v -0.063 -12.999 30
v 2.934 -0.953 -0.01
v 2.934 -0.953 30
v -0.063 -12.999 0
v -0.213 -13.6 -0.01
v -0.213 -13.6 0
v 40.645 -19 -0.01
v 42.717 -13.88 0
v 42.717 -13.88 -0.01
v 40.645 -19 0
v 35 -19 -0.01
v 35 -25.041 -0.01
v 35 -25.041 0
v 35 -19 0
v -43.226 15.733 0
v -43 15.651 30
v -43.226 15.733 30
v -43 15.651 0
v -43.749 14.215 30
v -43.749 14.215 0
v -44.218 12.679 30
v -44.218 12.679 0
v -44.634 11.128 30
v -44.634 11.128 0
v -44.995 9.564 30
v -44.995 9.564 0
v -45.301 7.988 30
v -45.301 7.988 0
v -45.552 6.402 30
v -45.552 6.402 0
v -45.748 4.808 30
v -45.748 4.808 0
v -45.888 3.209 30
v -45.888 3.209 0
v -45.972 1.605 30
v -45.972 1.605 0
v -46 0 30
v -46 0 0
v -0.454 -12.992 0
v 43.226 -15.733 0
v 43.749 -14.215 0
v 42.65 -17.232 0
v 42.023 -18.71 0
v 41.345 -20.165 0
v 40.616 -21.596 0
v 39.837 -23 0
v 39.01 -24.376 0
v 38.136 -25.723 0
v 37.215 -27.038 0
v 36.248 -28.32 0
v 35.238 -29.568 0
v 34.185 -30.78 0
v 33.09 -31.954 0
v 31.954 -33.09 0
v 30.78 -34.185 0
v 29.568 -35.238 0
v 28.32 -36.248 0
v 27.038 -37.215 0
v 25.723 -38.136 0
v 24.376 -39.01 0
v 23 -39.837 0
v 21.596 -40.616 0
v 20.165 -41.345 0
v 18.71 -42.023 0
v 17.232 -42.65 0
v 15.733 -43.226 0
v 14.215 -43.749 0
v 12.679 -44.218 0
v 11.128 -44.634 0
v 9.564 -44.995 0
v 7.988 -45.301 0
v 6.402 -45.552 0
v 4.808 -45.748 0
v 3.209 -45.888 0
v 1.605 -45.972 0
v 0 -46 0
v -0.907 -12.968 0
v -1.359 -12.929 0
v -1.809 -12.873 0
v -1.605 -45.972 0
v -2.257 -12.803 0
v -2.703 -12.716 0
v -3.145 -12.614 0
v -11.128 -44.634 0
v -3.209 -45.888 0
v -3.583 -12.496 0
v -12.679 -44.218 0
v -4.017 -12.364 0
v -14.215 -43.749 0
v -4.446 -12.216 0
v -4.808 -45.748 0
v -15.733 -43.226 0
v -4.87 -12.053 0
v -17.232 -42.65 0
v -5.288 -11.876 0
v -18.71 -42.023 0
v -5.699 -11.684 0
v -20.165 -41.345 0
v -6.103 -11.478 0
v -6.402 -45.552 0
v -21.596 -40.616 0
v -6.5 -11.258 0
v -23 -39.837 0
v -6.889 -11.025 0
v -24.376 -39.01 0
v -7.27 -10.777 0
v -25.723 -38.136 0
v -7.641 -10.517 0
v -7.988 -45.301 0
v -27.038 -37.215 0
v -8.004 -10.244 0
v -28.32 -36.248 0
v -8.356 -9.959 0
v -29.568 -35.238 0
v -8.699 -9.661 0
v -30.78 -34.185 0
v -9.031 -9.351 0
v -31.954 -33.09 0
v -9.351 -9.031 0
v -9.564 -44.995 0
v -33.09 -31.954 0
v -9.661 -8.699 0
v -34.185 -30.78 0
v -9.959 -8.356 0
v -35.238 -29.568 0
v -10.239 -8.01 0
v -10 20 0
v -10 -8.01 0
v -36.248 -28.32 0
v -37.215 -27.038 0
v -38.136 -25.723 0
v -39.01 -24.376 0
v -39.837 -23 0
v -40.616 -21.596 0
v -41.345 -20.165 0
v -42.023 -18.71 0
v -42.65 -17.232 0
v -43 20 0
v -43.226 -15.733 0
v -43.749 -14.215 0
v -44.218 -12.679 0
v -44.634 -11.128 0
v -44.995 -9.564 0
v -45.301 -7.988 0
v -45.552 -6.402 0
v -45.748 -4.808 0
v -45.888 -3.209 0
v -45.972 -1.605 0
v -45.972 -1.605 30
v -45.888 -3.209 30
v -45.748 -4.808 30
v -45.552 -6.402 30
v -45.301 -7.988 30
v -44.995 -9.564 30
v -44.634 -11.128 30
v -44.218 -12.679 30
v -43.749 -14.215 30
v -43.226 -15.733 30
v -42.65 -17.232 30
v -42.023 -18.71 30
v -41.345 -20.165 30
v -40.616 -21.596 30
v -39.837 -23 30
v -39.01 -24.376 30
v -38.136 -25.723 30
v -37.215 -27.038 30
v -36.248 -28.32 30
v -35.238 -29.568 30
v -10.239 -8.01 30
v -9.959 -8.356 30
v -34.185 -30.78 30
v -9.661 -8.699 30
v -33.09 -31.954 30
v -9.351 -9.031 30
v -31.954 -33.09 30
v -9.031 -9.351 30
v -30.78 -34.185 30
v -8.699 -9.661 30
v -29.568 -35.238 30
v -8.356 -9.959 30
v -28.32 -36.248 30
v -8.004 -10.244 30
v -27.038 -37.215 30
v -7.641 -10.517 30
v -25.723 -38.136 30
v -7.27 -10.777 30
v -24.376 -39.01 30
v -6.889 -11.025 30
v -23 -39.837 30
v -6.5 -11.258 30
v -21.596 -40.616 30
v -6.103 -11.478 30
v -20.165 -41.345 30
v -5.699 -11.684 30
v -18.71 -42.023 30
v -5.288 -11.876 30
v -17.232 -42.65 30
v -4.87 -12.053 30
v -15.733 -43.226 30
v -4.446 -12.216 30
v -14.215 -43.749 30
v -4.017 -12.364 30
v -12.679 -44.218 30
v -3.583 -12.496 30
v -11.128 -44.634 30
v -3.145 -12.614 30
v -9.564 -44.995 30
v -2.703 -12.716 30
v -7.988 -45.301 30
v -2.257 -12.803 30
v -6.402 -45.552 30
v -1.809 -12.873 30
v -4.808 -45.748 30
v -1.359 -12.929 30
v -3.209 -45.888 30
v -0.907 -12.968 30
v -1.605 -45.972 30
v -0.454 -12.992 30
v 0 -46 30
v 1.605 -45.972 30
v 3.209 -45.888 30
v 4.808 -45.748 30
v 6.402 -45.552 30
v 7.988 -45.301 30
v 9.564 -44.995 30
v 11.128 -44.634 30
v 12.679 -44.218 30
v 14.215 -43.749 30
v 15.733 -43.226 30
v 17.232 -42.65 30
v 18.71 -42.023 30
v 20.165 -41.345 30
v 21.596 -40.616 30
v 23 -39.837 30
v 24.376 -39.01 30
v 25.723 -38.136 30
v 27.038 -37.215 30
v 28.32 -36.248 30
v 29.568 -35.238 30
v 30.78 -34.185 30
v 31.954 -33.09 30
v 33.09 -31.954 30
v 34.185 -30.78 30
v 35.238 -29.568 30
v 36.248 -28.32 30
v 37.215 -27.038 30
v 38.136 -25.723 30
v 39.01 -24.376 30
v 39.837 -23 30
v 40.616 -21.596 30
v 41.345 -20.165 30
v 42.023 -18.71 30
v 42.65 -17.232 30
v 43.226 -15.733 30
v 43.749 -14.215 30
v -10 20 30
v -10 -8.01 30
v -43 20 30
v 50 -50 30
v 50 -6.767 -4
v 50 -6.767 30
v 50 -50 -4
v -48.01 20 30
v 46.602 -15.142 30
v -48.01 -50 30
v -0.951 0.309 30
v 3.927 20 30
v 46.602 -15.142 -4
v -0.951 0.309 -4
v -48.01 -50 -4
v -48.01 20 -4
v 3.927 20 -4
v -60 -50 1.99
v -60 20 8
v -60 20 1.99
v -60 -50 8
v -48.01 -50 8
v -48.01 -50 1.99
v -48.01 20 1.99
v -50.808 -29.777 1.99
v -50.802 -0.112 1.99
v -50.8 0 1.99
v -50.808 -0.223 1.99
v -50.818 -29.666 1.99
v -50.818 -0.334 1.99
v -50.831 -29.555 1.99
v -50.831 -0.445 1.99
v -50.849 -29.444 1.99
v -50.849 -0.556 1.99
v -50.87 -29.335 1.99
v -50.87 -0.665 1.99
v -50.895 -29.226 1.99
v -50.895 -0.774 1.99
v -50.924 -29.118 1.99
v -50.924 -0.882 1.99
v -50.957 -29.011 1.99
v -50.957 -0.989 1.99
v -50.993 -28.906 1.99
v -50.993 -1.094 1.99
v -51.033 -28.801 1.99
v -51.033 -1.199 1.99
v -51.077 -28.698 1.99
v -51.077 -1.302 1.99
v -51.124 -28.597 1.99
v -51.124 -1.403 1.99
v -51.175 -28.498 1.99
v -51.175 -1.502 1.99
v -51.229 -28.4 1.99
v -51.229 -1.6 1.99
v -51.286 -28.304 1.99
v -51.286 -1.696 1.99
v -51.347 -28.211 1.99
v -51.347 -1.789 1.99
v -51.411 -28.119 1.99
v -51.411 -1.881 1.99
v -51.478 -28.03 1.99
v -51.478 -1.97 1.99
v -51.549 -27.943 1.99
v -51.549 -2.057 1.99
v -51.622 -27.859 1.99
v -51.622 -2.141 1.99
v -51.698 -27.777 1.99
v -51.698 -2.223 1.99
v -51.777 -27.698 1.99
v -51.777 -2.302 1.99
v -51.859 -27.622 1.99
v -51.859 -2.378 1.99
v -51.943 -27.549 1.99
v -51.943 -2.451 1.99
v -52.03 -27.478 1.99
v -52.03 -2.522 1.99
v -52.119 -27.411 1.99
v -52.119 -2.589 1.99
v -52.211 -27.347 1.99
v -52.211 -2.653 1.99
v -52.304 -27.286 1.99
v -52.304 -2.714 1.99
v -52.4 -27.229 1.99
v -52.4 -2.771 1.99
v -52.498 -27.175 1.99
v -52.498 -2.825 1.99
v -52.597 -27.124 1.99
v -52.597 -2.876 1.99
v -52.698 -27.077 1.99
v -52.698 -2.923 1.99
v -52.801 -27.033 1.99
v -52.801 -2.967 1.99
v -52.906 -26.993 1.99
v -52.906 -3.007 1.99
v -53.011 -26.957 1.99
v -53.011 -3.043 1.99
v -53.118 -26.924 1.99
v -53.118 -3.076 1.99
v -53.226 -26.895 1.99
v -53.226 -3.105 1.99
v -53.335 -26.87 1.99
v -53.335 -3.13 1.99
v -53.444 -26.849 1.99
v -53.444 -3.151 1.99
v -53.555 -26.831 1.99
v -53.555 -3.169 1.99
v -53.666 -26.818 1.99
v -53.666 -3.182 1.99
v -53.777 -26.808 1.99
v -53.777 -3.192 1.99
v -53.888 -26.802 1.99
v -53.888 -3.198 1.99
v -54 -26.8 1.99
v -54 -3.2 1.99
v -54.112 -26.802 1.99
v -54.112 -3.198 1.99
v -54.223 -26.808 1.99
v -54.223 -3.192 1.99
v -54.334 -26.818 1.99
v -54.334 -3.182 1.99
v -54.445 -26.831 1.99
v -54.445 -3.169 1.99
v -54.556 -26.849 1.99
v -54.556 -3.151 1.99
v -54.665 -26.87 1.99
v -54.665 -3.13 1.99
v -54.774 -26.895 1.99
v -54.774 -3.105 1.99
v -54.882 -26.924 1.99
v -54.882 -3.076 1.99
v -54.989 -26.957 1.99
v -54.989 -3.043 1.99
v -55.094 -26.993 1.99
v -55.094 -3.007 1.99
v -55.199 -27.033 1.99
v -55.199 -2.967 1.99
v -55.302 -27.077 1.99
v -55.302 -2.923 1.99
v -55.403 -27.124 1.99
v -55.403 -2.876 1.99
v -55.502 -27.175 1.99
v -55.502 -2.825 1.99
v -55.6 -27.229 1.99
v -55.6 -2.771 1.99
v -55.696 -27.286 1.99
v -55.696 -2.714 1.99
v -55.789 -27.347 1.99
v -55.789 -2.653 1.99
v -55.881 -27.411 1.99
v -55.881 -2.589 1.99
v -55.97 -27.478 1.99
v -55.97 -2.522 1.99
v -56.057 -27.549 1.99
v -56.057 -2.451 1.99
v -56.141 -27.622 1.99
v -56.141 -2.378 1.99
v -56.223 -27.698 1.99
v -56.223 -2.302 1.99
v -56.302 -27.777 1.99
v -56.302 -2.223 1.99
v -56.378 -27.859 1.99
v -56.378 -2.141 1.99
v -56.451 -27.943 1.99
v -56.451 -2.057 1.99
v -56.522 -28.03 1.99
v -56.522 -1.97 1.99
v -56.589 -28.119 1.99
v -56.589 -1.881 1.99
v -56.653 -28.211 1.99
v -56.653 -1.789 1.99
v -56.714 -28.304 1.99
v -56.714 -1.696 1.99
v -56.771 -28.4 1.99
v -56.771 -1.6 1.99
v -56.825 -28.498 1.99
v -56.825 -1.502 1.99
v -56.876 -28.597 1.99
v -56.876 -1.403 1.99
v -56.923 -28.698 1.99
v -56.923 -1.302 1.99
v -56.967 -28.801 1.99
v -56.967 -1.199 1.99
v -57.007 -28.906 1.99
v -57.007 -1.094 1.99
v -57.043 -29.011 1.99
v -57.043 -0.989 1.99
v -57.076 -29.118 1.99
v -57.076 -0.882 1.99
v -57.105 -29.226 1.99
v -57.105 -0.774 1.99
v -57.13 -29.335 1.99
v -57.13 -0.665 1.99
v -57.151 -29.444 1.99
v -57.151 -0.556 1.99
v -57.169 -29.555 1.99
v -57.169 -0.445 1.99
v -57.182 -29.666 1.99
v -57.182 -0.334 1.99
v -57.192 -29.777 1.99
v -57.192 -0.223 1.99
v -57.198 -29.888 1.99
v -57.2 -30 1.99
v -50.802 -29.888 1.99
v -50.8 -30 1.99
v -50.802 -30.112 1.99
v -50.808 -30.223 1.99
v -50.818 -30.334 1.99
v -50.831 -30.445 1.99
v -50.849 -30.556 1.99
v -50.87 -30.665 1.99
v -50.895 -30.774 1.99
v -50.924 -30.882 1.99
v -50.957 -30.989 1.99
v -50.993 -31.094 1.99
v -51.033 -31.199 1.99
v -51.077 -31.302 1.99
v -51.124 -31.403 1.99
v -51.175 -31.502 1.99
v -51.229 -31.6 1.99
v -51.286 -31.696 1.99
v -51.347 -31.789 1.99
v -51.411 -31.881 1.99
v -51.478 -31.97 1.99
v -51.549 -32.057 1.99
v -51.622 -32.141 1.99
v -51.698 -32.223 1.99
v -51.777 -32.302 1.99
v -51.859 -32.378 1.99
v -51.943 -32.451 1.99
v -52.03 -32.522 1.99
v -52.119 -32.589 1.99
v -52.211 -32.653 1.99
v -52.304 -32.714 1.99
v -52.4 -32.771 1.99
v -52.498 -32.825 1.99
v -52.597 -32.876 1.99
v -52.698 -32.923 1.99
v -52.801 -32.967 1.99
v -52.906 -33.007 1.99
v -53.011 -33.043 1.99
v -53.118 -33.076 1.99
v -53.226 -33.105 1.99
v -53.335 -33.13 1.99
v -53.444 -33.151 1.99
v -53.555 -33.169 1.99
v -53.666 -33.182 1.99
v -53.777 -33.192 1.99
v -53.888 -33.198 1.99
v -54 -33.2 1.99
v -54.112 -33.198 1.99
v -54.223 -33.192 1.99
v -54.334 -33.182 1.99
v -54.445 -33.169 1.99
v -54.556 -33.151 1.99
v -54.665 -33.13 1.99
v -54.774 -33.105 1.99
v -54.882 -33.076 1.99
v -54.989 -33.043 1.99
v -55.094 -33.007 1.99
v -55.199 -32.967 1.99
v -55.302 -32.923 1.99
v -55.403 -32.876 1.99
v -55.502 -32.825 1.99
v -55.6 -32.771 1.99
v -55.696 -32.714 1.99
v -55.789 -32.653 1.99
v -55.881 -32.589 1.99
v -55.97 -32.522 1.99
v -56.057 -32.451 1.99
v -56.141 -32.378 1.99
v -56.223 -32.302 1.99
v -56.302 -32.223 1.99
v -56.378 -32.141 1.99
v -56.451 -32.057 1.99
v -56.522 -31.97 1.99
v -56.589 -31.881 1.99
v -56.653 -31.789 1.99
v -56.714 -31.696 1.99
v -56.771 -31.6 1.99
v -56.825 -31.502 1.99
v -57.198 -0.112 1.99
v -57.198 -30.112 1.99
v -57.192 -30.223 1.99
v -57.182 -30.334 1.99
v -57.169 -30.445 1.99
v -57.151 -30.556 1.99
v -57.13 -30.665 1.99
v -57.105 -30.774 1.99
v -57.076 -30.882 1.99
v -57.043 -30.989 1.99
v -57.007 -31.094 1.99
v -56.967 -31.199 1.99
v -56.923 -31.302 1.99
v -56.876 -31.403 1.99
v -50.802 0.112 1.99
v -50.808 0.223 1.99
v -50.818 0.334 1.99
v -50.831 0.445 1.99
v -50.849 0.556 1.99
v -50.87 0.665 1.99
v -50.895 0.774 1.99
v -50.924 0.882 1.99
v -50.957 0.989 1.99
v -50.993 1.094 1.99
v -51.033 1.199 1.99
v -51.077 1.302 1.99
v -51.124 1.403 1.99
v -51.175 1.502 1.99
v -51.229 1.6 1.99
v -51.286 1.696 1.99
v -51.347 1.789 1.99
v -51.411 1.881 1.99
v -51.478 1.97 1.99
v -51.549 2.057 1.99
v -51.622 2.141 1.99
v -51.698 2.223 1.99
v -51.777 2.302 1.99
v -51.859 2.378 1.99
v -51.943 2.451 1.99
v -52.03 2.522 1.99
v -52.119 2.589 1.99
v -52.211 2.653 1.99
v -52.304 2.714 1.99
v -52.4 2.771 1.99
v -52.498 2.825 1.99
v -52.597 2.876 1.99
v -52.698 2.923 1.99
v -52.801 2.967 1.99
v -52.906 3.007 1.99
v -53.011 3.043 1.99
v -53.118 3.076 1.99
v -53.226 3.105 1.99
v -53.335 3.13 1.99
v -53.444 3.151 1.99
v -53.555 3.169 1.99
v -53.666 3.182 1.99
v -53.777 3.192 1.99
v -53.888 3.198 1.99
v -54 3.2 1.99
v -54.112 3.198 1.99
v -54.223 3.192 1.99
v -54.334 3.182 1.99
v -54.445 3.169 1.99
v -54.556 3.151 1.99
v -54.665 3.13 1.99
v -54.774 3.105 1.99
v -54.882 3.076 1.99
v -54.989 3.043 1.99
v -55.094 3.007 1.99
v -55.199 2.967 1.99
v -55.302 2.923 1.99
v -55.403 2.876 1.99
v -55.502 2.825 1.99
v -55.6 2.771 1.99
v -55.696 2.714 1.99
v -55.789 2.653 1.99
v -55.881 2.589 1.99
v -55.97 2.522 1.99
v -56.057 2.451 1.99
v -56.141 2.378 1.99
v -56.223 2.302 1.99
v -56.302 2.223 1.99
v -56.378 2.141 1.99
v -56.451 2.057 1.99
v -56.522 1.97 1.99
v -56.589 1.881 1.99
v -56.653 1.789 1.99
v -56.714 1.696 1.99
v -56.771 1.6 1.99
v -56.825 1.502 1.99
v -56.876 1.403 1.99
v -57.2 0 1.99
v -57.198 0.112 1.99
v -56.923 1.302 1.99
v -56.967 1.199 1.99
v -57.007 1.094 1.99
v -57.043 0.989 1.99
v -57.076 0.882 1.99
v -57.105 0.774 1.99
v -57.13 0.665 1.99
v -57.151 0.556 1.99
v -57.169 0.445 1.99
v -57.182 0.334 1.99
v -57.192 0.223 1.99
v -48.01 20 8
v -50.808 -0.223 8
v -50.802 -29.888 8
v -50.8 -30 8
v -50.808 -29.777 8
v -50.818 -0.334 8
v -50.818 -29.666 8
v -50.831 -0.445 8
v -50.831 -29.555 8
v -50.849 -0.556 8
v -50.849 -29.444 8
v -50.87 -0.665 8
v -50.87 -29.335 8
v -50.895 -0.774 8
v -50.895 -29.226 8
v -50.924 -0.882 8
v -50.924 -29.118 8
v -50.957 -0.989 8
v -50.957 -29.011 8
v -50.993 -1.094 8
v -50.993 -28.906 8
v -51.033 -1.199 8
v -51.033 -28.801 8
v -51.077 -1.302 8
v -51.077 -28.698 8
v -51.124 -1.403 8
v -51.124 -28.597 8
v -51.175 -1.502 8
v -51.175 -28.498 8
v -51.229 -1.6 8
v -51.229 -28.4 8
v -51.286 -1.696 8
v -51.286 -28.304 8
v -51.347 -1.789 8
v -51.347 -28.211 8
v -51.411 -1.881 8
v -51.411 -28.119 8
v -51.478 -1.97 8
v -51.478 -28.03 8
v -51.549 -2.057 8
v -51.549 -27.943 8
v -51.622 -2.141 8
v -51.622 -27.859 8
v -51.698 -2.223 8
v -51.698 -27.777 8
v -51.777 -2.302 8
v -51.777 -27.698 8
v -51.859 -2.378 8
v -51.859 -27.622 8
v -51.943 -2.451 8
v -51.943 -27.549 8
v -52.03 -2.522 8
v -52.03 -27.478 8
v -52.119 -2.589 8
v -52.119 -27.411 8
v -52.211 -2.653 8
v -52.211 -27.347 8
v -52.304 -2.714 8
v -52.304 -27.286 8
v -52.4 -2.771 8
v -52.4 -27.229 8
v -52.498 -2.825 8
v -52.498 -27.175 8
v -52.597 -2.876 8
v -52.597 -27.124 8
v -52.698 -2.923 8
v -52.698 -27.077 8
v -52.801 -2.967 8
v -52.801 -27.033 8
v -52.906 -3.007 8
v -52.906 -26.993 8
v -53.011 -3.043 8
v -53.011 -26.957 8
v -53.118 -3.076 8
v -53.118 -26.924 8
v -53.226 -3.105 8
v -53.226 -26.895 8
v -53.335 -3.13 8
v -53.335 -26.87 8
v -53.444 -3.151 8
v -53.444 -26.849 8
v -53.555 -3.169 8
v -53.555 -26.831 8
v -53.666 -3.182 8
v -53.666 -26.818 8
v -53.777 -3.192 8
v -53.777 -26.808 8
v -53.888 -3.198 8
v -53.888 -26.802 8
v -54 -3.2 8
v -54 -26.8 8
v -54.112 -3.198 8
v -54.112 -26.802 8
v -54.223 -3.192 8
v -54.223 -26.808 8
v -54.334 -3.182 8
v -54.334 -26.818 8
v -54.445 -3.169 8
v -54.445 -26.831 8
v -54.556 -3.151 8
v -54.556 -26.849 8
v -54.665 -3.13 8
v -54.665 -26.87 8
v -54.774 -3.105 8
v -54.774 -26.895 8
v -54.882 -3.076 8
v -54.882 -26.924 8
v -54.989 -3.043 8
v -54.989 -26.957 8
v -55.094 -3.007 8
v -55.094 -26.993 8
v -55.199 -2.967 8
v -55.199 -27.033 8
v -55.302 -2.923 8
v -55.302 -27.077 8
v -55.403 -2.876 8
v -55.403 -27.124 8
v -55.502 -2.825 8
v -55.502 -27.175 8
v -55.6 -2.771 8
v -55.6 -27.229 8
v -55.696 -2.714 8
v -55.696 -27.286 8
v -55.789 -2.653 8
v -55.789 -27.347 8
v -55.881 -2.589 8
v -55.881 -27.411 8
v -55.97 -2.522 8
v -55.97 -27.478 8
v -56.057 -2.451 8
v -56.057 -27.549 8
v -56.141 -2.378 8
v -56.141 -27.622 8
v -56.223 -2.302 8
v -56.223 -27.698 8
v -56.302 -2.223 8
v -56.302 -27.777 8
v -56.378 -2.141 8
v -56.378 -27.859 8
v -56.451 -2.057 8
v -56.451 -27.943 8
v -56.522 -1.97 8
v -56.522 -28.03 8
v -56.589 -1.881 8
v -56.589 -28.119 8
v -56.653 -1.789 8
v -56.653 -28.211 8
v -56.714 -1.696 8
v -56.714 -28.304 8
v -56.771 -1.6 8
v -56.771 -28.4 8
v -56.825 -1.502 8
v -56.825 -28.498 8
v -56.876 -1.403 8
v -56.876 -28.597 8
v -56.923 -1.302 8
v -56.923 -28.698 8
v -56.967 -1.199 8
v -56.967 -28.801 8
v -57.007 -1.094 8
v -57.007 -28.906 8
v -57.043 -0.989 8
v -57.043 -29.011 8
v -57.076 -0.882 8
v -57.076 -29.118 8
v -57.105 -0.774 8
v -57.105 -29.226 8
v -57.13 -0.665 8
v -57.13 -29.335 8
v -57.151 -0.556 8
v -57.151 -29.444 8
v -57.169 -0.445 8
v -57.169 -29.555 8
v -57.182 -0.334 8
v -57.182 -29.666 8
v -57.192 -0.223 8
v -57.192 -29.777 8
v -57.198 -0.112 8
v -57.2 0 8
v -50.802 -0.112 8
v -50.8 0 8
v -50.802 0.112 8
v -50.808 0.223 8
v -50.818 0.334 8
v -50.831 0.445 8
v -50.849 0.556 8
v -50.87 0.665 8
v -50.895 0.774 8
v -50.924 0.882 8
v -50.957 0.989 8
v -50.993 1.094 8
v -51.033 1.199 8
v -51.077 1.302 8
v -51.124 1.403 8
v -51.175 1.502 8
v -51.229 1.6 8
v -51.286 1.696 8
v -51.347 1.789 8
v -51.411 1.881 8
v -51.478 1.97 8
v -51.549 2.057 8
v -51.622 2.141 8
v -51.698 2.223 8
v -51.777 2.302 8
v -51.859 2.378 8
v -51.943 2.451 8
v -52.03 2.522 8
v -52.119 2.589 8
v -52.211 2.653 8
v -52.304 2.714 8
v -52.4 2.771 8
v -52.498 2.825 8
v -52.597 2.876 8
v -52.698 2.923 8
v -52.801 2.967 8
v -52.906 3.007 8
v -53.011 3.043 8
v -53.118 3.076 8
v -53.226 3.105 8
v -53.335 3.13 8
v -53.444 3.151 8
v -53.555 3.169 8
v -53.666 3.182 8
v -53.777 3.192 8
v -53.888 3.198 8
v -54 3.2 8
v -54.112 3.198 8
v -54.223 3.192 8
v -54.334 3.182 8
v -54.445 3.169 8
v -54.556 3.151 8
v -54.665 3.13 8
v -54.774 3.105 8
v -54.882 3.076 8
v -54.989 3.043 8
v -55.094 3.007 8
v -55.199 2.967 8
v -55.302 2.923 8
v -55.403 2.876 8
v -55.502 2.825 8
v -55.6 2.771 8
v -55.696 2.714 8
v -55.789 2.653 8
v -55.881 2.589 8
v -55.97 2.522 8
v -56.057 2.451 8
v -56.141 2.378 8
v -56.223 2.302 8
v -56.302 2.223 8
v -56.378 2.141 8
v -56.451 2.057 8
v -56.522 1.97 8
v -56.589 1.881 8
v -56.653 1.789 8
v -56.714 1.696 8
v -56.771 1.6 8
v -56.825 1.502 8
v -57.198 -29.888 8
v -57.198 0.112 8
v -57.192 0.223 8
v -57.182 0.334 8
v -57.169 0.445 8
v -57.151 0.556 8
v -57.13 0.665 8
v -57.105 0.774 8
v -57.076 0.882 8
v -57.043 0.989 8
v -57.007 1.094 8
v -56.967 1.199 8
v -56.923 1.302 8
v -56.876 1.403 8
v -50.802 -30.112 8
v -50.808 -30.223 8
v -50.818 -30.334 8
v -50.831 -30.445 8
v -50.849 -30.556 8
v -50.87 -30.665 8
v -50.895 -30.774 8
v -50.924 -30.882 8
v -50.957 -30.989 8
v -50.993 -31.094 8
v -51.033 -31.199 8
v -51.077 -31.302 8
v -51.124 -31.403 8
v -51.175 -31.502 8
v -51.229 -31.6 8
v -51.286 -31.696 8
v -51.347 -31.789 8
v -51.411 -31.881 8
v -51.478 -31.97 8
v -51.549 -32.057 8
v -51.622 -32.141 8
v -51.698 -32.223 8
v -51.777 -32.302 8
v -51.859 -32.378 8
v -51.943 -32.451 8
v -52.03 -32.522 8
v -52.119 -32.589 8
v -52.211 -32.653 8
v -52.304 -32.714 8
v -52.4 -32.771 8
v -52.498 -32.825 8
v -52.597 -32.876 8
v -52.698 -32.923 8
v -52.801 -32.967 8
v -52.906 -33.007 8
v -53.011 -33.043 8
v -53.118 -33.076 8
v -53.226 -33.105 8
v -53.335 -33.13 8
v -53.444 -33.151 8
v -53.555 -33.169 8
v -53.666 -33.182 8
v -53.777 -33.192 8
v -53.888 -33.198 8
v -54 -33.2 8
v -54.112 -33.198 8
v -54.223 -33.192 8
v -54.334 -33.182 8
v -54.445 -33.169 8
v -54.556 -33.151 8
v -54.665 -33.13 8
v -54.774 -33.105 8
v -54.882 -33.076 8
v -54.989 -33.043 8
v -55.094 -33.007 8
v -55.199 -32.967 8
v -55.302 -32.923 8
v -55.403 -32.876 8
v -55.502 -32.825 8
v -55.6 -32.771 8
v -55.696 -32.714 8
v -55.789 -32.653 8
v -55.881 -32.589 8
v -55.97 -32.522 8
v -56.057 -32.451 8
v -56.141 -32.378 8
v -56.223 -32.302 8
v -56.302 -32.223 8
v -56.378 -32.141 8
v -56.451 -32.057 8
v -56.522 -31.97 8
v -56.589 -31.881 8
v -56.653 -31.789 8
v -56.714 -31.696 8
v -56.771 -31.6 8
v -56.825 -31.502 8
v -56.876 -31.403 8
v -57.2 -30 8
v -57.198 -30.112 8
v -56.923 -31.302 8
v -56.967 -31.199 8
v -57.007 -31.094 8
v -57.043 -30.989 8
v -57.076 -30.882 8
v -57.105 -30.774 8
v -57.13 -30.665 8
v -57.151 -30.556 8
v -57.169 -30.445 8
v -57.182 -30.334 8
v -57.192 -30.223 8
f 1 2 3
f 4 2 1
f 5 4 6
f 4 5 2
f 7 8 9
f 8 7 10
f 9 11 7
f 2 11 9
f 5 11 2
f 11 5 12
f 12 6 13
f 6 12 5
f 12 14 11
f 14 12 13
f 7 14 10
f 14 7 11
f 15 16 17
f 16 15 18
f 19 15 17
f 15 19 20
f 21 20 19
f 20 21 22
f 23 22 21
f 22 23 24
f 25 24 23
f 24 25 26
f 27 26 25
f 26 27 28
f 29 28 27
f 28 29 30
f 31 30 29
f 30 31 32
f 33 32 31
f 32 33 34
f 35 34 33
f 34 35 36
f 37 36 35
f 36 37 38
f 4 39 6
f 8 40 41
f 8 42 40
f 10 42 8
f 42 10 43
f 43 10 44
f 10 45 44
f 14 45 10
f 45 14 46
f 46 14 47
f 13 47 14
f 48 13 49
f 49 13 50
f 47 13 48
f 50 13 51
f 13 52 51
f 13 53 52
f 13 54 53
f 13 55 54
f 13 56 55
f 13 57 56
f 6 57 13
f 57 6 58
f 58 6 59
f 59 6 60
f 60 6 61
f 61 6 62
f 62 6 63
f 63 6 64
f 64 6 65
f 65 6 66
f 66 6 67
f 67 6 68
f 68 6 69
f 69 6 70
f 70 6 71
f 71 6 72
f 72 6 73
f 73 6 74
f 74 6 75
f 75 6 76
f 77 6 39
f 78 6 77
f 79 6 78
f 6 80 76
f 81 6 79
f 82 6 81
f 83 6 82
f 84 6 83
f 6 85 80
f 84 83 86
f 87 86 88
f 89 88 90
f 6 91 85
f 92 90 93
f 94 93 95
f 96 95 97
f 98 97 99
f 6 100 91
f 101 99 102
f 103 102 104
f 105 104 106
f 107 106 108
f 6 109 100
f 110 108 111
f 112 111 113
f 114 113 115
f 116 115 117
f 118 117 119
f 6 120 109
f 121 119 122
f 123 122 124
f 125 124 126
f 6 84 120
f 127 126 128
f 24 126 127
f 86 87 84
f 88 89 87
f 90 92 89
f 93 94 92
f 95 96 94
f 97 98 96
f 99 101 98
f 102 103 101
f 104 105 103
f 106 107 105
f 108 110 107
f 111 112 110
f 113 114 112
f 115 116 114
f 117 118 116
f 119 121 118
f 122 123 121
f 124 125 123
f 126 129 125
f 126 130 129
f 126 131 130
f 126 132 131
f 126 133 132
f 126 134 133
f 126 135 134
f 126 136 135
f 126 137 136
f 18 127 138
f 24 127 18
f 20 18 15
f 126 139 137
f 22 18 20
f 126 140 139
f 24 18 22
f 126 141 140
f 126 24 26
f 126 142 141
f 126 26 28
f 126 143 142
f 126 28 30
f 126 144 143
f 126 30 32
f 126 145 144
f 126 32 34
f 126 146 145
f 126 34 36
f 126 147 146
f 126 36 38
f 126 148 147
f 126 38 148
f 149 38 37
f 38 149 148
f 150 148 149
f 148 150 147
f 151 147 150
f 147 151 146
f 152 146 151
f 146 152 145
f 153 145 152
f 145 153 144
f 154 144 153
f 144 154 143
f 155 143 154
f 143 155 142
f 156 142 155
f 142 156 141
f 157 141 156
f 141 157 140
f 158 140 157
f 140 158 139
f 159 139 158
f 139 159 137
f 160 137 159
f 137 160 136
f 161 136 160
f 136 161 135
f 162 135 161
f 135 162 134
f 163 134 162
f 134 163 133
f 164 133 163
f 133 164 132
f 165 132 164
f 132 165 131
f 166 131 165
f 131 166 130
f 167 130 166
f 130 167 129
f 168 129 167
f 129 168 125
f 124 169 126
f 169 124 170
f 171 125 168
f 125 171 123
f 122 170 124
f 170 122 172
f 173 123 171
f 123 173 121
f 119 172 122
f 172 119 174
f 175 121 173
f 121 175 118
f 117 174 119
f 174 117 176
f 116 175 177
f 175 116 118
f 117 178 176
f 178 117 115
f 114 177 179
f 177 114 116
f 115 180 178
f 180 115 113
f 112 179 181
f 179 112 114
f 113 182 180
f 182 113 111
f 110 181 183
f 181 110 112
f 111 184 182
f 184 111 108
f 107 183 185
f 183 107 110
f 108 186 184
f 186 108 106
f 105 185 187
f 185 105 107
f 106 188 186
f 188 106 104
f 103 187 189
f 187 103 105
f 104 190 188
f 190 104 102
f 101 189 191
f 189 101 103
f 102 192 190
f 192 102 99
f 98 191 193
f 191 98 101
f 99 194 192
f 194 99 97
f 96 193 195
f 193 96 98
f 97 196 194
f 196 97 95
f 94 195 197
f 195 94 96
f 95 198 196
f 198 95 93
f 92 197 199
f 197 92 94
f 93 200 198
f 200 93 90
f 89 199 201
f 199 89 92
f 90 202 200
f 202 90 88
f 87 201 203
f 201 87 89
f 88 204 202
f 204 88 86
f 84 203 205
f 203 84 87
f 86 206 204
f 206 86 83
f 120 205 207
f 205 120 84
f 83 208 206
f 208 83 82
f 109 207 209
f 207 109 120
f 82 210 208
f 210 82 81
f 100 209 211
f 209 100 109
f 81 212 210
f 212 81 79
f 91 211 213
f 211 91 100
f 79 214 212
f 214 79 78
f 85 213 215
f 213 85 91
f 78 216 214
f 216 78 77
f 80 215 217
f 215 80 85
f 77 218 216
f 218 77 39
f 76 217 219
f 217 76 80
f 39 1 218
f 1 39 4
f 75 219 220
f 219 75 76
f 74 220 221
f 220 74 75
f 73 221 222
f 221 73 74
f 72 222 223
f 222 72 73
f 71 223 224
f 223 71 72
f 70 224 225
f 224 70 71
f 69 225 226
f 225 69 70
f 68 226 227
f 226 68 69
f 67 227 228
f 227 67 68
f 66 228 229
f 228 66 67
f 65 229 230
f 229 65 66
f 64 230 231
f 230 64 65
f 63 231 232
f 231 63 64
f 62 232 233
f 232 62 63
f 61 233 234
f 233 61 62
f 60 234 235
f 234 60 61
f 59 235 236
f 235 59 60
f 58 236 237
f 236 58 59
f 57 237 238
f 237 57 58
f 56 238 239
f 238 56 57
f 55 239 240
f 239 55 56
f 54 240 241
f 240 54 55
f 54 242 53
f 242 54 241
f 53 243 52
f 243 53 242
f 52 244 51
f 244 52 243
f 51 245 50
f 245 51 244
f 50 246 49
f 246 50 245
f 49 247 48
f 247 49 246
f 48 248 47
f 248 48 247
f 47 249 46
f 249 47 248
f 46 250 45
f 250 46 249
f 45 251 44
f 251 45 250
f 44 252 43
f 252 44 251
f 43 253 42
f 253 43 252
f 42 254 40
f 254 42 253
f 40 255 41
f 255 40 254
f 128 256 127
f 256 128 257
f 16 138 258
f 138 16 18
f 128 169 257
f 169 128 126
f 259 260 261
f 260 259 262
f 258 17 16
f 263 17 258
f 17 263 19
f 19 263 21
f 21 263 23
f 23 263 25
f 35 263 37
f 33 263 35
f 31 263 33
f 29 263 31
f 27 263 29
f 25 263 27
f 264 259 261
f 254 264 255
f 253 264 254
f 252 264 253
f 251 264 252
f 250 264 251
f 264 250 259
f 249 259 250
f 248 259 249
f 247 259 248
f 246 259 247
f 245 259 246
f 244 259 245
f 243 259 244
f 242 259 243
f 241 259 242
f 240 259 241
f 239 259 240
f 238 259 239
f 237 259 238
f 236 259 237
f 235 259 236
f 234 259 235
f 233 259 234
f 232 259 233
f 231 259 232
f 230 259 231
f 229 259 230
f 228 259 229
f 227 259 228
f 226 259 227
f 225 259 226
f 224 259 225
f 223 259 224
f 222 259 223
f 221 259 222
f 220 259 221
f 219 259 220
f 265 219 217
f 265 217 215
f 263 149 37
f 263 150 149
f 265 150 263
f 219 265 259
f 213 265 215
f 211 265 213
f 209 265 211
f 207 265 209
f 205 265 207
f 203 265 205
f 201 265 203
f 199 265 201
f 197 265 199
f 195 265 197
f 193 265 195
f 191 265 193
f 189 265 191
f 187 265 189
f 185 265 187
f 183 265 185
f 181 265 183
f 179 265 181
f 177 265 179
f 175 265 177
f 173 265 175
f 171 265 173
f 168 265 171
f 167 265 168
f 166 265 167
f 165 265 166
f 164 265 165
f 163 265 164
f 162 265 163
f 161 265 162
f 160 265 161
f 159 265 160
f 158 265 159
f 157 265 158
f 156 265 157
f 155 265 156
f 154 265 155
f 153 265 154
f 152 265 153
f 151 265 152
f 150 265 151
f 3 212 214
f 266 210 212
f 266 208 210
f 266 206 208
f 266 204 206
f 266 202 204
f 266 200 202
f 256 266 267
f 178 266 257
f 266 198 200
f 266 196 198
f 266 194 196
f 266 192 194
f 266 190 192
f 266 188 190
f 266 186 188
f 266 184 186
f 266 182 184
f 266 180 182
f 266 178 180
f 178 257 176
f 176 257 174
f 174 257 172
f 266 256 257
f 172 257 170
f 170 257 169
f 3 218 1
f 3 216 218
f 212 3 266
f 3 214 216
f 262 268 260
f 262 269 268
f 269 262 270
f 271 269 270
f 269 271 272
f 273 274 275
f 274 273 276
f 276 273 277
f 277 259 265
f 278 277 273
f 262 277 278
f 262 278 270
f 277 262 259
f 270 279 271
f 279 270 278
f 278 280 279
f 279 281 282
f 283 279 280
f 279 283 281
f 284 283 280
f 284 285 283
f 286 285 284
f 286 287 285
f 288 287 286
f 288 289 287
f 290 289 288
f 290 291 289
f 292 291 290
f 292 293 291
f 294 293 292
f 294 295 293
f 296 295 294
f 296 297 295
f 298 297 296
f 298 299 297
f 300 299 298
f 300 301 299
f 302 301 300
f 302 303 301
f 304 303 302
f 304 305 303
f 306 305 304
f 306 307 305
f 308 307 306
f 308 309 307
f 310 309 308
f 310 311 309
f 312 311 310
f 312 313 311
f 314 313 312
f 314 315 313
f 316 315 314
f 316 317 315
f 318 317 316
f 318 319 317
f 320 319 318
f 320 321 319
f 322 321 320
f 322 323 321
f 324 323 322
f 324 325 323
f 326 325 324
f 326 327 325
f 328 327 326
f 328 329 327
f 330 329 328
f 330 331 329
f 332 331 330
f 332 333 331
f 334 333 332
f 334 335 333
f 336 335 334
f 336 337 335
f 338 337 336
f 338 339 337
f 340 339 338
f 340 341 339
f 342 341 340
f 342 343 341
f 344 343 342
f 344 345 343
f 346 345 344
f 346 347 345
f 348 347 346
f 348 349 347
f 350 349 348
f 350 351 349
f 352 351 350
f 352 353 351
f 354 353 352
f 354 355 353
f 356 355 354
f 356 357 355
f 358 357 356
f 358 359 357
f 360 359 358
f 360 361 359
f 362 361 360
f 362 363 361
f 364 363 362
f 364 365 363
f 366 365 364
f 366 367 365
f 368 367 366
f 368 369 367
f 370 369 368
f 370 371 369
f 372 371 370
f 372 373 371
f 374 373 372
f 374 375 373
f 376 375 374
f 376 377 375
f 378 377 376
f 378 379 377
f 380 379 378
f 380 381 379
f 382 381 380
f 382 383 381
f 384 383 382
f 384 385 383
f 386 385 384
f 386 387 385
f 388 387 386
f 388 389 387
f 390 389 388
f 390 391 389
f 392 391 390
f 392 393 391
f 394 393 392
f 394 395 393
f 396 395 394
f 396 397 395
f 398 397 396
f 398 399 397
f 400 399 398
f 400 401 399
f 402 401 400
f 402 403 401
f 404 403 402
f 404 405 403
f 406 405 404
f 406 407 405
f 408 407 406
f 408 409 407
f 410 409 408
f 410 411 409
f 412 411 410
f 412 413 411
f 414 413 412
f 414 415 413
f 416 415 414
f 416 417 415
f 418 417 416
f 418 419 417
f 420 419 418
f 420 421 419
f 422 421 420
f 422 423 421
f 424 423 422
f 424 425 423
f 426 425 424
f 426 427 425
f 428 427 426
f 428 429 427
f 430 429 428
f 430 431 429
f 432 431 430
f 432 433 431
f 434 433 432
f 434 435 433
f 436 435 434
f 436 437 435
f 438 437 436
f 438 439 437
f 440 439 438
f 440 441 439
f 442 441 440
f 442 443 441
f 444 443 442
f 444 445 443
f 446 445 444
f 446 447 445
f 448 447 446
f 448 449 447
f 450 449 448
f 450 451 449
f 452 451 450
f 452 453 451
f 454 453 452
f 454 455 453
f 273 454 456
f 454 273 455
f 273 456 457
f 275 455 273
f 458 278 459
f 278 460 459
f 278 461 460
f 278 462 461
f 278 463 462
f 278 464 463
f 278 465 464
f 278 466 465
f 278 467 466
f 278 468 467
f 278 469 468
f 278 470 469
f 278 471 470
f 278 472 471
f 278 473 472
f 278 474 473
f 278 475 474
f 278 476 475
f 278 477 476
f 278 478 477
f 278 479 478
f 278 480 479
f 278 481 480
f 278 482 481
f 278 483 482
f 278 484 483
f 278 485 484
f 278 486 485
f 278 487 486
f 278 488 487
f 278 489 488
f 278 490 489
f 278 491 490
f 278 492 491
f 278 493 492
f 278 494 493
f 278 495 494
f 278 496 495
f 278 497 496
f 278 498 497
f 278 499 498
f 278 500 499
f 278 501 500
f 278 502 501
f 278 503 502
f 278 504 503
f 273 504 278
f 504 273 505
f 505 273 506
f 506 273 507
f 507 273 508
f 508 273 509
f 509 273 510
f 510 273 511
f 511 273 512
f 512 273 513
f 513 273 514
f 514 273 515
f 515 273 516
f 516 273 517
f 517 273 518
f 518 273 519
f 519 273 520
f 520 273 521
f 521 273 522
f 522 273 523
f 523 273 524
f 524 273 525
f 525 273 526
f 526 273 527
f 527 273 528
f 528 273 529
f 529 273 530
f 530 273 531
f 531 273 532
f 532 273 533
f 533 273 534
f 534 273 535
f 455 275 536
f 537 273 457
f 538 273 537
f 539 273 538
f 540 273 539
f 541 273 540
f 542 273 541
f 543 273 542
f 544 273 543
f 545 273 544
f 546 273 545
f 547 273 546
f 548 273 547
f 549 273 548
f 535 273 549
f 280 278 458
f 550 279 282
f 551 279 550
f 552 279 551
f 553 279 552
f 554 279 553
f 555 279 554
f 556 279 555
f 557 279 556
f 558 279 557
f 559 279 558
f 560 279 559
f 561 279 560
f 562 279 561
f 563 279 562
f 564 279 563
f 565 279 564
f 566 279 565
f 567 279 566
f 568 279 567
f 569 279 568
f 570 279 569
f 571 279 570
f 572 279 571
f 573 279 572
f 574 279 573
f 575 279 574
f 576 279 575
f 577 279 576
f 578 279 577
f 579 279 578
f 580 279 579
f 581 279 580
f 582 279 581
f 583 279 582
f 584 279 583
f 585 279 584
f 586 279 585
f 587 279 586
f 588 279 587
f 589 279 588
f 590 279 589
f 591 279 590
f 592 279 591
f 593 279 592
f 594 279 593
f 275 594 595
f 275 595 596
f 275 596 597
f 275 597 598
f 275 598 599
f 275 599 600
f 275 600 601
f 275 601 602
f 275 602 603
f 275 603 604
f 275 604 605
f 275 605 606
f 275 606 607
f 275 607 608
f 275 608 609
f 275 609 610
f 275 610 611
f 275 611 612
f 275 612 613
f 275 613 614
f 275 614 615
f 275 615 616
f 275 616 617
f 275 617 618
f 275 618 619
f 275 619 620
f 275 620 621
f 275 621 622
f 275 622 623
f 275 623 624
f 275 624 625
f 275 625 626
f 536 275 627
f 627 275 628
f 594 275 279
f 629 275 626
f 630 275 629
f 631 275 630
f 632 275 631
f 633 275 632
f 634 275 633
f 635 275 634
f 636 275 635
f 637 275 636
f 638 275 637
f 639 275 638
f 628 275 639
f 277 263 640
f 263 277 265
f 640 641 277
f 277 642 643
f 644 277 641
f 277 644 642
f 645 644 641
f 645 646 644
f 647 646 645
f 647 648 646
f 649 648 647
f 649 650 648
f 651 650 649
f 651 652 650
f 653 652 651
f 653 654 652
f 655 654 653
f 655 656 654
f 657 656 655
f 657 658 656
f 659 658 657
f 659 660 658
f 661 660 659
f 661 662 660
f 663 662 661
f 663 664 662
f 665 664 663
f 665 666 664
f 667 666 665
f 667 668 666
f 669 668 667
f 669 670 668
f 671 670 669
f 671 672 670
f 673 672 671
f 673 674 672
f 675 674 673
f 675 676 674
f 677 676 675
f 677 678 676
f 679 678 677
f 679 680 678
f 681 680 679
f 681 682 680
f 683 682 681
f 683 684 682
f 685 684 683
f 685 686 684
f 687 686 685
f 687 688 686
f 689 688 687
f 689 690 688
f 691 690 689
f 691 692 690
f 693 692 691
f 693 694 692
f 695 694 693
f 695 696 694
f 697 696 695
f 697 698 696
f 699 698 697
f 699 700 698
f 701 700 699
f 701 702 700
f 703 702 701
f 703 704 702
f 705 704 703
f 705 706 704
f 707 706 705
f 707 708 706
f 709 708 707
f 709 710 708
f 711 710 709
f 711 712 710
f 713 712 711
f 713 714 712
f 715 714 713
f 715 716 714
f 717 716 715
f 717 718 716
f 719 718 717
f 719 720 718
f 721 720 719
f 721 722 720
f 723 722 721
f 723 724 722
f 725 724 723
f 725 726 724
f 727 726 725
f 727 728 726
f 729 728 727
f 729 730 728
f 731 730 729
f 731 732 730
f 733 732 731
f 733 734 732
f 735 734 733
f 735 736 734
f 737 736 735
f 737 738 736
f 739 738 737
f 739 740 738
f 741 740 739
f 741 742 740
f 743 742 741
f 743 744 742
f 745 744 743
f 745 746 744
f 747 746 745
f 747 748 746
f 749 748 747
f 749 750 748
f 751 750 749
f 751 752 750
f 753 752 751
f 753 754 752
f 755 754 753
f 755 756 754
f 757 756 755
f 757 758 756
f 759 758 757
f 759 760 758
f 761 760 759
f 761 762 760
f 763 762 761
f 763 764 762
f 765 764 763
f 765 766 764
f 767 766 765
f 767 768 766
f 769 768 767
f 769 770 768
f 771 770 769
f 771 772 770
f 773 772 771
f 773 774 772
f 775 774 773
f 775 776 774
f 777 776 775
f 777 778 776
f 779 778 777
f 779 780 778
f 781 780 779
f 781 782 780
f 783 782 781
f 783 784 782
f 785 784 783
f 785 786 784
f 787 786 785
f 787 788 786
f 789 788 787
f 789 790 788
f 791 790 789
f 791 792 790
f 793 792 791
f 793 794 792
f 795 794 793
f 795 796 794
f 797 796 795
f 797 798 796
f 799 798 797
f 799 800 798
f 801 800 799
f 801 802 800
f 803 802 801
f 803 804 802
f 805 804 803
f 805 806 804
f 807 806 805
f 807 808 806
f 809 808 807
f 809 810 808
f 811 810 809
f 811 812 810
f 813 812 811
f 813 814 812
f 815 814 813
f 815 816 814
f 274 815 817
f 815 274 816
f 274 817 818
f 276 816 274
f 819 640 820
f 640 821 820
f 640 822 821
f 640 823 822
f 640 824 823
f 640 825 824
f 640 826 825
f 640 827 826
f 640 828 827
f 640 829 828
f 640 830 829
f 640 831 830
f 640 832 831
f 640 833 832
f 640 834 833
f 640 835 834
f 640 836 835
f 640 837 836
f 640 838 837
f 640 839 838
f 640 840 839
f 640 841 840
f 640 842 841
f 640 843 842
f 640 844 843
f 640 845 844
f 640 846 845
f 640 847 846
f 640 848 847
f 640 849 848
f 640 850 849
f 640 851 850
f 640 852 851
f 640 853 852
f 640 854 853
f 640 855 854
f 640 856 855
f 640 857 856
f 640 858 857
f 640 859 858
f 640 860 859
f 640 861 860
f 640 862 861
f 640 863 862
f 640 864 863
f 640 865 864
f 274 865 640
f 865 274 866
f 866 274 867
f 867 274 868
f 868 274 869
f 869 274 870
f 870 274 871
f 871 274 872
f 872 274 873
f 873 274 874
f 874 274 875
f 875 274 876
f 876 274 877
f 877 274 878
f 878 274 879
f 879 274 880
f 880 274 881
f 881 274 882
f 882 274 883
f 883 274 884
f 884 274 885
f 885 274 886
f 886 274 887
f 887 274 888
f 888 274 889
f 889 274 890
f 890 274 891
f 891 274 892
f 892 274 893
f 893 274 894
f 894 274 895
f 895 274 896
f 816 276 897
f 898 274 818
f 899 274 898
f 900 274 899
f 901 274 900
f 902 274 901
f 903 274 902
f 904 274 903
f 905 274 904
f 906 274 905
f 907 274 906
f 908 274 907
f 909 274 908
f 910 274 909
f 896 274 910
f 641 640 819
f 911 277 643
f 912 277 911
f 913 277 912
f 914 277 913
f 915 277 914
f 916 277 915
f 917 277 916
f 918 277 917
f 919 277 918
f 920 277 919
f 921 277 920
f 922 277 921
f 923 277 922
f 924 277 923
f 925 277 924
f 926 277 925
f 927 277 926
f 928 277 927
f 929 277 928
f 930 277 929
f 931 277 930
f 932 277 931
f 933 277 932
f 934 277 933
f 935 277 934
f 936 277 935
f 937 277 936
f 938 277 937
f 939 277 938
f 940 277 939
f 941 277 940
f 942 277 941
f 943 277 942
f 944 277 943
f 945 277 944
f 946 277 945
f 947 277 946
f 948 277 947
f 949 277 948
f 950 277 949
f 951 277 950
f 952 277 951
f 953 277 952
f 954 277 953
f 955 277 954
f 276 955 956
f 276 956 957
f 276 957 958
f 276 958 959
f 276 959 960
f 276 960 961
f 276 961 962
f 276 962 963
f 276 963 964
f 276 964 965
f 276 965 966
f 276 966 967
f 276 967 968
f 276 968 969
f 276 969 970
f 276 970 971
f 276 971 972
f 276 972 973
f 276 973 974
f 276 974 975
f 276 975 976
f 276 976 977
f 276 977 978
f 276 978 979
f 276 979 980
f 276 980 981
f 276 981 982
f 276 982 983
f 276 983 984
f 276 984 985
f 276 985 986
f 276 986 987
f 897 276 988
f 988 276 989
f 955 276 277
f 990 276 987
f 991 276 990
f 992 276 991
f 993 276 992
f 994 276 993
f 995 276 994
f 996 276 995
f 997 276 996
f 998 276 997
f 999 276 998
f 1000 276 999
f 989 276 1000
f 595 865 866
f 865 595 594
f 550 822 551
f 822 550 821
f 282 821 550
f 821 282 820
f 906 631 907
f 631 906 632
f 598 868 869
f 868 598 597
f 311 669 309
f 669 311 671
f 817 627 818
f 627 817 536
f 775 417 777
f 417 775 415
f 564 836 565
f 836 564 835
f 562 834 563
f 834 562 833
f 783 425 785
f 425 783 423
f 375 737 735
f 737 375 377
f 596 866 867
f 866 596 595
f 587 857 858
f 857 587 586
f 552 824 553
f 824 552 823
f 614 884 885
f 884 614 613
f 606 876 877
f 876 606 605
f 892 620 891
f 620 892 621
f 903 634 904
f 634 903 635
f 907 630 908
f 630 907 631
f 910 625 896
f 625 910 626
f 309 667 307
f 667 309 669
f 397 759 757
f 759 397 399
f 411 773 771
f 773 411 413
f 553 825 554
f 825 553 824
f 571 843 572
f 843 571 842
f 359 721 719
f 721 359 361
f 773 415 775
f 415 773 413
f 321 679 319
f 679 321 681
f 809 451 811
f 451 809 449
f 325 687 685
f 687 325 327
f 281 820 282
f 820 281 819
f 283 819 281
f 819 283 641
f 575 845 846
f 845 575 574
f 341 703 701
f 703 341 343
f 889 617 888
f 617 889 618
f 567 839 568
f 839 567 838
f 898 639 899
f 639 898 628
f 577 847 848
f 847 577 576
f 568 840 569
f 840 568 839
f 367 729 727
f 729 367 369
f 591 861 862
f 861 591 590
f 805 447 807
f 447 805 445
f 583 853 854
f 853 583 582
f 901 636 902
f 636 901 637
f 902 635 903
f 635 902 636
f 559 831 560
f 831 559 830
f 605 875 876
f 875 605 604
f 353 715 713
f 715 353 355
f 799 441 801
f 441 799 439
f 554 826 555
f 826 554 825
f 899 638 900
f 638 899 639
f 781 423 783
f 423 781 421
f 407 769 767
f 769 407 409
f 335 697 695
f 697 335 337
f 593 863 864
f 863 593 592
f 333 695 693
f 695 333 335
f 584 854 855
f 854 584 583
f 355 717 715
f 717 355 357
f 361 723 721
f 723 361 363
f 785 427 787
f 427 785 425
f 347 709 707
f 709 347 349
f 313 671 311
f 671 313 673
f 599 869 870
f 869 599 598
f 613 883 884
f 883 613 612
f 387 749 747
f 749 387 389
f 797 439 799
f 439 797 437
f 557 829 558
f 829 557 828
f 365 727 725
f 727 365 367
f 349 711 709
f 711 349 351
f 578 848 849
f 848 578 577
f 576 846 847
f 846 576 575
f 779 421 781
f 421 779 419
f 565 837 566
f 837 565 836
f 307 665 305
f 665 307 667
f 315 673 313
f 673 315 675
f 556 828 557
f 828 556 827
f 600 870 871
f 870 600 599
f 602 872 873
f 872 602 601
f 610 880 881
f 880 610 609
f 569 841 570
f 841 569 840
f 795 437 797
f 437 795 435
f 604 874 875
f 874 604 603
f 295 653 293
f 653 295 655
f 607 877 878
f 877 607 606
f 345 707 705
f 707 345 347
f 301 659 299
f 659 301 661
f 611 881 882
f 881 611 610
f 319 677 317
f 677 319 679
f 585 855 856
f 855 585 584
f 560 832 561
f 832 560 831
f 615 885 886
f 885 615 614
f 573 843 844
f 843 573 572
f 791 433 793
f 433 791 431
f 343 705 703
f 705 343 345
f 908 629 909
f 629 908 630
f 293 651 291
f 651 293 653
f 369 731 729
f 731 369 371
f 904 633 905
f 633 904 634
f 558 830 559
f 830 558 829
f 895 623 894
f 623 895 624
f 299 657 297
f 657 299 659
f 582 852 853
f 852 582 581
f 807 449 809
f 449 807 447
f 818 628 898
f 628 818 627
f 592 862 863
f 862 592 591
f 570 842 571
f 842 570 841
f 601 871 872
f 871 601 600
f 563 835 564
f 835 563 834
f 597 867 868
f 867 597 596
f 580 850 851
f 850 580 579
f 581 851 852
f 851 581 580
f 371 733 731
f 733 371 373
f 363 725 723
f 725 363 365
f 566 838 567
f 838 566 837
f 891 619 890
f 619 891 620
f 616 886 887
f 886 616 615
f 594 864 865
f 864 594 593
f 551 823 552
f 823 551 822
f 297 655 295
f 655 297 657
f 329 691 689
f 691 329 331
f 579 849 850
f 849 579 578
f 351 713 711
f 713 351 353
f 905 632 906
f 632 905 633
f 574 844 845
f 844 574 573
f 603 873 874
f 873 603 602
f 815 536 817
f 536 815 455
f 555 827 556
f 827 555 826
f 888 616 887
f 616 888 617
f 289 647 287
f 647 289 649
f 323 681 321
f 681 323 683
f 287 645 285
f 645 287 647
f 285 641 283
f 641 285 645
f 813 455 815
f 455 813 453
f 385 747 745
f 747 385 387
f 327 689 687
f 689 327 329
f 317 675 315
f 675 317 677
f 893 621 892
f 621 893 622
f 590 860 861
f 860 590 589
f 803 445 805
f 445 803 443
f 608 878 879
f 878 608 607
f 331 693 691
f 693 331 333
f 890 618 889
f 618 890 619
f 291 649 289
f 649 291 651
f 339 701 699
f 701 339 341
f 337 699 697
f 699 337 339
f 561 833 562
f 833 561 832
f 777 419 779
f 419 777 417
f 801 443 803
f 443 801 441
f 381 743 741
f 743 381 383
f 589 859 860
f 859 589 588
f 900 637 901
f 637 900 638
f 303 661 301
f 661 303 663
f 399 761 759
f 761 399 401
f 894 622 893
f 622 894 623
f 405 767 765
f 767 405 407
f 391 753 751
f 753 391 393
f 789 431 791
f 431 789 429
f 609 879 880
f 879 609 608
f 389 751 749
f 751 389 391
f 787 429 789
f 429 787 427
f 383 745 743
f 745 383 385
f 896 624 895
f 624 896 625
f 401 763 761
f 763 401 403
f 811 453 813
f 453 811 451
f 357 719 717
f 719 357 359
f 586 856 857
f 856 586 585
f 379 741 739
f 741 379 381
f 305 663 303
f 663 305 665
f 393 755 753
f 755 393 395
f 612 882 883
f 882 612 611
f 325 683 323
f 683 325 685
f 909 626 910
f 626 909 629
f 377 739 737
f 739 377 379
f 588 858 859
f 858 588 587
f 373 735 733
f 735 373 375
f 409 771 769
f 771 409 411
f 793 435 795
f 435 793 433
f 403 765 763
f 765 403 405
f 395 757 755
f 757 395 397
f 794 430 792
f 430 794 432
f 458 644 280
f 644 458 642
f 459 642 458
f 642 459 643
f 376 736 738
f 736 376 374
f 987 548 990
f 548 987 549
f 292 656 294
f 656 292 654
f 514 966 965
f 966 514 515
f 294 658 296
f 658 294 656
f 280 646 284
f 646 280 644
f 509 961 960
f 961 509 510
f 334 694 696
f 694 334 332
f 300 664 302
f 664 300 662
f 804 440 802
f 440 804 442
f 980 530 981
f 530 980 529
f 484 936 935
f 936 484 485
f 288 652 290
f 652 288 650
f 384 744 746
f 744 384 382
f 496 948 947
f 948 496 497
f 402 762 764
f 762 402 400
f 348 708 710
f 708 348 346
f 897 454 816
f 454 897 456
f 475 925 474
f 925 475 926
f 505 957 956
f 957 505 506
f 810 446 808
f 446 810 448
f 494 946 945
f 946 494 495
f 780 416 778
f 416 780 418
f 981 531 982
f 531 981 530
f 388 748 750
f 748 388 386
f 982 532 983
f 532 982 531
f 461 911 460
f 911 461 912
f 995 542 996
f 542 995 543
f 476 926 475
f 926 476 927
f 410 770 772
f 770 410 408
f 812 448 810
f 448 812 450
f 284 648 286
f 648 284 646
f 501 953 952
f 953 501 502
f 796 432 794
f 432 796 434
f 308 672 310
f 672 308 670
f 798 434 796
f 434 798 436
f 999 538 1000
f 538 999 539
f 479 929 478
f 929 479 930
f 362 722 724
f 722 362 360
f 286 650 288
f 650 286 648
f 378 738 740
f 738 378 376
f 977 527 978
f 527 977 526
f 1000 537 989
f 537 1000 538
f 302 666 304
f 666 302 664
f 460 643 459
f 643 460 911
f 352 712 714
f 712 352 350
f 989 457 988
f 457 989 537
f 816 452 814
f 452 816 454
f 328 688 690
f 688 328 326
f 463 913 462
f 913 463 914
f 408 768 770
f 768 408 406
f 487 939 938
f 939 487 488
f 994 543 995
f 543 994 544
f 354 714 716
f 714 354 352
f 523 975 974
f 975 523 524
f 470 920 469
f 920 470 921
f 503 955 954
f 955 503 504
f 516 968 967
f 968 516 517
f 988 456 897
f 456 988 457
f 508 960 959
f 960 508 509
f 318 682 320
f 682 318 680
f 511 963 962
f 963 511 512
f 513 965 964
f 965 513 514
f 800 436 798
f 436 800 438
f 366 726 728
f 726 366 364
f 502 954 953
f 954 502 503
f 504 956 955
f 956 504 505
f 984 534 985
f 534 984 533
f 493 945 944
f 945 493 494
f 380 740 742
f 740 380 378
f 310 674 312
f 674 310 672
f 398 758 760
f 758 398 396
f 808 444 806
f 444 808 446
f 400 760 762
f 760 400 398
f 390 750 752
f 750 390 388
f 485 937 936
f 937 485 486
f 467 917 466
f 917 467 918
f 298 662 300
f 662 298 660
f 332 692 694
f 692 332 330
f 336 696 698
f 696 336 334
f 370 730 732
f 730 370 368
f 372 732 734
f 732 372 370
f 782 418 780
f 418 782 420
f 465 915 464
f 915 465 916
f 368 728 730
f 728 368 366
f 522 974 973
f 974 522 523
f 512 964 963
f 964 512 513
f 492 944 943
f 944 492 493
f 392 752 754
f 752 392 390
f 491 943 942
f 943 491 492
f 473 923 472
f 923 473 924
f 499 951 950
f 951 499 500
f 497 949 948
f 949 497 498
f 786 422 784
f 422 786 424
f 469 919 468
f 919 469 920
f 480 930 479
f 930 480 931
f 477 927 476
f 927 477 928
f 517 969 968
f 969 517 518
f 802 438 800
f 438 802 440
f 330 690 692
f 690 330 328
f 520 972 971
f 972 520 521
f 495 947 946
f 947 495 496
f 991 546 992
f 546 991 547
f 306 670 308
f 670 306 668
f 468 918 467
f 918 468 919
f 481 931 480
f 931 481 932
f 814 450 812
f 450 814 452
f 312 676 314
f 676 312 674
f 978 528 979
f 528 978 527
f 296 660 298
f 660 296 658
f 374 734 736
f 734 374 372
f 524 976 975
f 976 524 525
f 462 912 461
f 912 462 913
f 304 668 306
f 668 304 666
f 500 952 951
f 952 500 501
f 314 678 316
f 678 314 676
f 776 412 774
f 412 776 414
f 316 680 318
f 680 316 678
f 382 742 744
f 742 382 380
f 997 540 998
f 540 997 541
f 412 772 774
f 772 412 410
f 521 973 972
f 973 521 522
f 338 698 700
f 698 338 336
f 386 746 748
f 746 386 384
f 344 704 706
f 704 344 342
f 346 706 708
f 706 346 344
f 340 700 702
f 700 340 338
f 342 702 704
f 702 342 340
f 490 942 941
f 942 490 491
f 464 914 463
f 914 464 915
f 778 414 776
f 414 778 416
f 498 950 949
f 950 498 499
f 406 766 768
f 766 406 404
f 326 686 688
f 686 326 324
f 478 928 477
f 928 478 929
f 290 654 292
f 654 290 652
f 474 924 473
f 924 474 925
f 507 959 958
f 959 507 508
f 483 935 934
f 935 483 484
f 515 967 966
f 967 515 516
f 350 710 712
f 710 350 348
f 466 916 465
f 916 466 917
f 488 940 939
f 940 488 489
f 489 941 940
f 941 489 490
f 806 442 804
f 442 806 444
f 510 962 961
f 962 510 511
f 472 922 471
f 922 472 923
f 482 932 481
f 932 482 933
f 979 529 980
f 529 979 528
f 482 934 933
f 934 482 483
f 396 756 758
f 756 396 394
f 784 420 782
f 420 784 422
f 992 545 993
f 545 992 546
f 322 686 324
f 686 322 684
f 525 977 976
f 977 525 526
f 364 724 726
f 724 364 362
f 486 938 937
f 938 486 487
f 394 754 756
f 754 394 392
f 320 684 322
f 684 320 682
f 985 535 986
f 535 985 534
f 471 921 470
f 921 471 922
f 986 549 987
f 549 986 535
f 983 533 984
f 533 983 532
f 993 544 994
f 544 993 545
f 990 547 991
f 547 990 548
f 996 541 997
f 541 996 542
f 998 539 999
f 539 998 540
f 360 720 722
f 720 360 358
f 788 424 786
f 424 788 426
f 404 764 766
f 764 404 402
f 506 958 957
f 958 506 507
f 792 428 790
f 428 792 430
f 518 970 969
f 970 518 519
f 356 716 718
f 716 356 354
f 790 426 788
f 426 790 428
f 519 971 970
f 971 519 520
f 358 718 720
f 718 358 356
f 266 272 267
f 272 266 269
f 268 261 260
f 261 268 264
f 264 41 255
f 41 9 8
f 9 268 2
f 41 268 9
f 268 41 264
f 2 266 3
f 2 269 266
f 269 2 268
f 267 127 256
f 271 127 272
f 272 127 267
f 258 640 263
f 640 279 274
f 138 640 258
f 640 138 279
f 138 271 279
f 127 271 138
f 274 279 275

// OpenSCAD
// $fa = 1;
// $fs = 0.4;



$fn = $preview ? 24 : 180;




    module wedge(w1=80,dw=15,l=210,h=55){
        polyhedron(
            points=[[0,0,0], [w1,0,0], [w1-dw,l,0], [dw,l,0], [dw,l,h], [w1-dw,l,h]],
            faces=[[0,1,2,3],[5,4,3,2],[0,4,5,1],[0,3,4],[5,2,1]]
        );
    }
   
    module bar(w=80,dw=15,l=210,h1=0,h2=50){
        polyhedron(
            points=[[0,0,0], [w,0,0], [w-dw,l,h1], [dw,l,h1], [0,0,h2 ], [w,0,h2], [w-dw,l,h2], [dw,l,h2] ],
            faces=[
                [0,1,2,3],  // bottom
                [4,5,1,0],  // front
                [7,6,5,4],  // top
                [5,6,2,1],  // right
                [6,7,3,2],  // back
                [7,4,0,3]] // left
        );
    }



difference(){
    translate([-5,0,13])cube([110,100,34], center=true);

    translate([-60.01,-60,-5.01])cube([12,100,7], center=false);

    translate([-60.01,-60,8])cube([12,100,60], center=false);
    
   translate([-54,0,-5.01]) cylinder(60, 3.2,3.2);

   translate([-54,-30,-5.01]) cylinder(60, 3.2,3.2);
union(){
    path_radius = 46;
    path_diameter = 33;
    translate ([0,0,0])rotate([0,0,160])rotate_extrude(angle=200){
        translate([path_radius - path_diameter, 0])square(path_diameter);
    };
    translate([0,0,-0.01])difference(){
        rotate([0,0,-18])translate([-11,200,90])rotate([0,180,180])bar(w=70,h1=55,h2=90,l=213);
        translate([35,-29,-400])cube([10,10,1000]);
    };
    
            
 translate([-50+(33/2)+7,50-0.01-8,25])cube([33,100,50], center = true);   
 
        };  
        rotate([0,0,-18])translate([64,210,-10.001])rotate([0,0,180])bar(h2=60);  
      translate([0,120,0])cube([200,200,200],center = true);  
};

       
